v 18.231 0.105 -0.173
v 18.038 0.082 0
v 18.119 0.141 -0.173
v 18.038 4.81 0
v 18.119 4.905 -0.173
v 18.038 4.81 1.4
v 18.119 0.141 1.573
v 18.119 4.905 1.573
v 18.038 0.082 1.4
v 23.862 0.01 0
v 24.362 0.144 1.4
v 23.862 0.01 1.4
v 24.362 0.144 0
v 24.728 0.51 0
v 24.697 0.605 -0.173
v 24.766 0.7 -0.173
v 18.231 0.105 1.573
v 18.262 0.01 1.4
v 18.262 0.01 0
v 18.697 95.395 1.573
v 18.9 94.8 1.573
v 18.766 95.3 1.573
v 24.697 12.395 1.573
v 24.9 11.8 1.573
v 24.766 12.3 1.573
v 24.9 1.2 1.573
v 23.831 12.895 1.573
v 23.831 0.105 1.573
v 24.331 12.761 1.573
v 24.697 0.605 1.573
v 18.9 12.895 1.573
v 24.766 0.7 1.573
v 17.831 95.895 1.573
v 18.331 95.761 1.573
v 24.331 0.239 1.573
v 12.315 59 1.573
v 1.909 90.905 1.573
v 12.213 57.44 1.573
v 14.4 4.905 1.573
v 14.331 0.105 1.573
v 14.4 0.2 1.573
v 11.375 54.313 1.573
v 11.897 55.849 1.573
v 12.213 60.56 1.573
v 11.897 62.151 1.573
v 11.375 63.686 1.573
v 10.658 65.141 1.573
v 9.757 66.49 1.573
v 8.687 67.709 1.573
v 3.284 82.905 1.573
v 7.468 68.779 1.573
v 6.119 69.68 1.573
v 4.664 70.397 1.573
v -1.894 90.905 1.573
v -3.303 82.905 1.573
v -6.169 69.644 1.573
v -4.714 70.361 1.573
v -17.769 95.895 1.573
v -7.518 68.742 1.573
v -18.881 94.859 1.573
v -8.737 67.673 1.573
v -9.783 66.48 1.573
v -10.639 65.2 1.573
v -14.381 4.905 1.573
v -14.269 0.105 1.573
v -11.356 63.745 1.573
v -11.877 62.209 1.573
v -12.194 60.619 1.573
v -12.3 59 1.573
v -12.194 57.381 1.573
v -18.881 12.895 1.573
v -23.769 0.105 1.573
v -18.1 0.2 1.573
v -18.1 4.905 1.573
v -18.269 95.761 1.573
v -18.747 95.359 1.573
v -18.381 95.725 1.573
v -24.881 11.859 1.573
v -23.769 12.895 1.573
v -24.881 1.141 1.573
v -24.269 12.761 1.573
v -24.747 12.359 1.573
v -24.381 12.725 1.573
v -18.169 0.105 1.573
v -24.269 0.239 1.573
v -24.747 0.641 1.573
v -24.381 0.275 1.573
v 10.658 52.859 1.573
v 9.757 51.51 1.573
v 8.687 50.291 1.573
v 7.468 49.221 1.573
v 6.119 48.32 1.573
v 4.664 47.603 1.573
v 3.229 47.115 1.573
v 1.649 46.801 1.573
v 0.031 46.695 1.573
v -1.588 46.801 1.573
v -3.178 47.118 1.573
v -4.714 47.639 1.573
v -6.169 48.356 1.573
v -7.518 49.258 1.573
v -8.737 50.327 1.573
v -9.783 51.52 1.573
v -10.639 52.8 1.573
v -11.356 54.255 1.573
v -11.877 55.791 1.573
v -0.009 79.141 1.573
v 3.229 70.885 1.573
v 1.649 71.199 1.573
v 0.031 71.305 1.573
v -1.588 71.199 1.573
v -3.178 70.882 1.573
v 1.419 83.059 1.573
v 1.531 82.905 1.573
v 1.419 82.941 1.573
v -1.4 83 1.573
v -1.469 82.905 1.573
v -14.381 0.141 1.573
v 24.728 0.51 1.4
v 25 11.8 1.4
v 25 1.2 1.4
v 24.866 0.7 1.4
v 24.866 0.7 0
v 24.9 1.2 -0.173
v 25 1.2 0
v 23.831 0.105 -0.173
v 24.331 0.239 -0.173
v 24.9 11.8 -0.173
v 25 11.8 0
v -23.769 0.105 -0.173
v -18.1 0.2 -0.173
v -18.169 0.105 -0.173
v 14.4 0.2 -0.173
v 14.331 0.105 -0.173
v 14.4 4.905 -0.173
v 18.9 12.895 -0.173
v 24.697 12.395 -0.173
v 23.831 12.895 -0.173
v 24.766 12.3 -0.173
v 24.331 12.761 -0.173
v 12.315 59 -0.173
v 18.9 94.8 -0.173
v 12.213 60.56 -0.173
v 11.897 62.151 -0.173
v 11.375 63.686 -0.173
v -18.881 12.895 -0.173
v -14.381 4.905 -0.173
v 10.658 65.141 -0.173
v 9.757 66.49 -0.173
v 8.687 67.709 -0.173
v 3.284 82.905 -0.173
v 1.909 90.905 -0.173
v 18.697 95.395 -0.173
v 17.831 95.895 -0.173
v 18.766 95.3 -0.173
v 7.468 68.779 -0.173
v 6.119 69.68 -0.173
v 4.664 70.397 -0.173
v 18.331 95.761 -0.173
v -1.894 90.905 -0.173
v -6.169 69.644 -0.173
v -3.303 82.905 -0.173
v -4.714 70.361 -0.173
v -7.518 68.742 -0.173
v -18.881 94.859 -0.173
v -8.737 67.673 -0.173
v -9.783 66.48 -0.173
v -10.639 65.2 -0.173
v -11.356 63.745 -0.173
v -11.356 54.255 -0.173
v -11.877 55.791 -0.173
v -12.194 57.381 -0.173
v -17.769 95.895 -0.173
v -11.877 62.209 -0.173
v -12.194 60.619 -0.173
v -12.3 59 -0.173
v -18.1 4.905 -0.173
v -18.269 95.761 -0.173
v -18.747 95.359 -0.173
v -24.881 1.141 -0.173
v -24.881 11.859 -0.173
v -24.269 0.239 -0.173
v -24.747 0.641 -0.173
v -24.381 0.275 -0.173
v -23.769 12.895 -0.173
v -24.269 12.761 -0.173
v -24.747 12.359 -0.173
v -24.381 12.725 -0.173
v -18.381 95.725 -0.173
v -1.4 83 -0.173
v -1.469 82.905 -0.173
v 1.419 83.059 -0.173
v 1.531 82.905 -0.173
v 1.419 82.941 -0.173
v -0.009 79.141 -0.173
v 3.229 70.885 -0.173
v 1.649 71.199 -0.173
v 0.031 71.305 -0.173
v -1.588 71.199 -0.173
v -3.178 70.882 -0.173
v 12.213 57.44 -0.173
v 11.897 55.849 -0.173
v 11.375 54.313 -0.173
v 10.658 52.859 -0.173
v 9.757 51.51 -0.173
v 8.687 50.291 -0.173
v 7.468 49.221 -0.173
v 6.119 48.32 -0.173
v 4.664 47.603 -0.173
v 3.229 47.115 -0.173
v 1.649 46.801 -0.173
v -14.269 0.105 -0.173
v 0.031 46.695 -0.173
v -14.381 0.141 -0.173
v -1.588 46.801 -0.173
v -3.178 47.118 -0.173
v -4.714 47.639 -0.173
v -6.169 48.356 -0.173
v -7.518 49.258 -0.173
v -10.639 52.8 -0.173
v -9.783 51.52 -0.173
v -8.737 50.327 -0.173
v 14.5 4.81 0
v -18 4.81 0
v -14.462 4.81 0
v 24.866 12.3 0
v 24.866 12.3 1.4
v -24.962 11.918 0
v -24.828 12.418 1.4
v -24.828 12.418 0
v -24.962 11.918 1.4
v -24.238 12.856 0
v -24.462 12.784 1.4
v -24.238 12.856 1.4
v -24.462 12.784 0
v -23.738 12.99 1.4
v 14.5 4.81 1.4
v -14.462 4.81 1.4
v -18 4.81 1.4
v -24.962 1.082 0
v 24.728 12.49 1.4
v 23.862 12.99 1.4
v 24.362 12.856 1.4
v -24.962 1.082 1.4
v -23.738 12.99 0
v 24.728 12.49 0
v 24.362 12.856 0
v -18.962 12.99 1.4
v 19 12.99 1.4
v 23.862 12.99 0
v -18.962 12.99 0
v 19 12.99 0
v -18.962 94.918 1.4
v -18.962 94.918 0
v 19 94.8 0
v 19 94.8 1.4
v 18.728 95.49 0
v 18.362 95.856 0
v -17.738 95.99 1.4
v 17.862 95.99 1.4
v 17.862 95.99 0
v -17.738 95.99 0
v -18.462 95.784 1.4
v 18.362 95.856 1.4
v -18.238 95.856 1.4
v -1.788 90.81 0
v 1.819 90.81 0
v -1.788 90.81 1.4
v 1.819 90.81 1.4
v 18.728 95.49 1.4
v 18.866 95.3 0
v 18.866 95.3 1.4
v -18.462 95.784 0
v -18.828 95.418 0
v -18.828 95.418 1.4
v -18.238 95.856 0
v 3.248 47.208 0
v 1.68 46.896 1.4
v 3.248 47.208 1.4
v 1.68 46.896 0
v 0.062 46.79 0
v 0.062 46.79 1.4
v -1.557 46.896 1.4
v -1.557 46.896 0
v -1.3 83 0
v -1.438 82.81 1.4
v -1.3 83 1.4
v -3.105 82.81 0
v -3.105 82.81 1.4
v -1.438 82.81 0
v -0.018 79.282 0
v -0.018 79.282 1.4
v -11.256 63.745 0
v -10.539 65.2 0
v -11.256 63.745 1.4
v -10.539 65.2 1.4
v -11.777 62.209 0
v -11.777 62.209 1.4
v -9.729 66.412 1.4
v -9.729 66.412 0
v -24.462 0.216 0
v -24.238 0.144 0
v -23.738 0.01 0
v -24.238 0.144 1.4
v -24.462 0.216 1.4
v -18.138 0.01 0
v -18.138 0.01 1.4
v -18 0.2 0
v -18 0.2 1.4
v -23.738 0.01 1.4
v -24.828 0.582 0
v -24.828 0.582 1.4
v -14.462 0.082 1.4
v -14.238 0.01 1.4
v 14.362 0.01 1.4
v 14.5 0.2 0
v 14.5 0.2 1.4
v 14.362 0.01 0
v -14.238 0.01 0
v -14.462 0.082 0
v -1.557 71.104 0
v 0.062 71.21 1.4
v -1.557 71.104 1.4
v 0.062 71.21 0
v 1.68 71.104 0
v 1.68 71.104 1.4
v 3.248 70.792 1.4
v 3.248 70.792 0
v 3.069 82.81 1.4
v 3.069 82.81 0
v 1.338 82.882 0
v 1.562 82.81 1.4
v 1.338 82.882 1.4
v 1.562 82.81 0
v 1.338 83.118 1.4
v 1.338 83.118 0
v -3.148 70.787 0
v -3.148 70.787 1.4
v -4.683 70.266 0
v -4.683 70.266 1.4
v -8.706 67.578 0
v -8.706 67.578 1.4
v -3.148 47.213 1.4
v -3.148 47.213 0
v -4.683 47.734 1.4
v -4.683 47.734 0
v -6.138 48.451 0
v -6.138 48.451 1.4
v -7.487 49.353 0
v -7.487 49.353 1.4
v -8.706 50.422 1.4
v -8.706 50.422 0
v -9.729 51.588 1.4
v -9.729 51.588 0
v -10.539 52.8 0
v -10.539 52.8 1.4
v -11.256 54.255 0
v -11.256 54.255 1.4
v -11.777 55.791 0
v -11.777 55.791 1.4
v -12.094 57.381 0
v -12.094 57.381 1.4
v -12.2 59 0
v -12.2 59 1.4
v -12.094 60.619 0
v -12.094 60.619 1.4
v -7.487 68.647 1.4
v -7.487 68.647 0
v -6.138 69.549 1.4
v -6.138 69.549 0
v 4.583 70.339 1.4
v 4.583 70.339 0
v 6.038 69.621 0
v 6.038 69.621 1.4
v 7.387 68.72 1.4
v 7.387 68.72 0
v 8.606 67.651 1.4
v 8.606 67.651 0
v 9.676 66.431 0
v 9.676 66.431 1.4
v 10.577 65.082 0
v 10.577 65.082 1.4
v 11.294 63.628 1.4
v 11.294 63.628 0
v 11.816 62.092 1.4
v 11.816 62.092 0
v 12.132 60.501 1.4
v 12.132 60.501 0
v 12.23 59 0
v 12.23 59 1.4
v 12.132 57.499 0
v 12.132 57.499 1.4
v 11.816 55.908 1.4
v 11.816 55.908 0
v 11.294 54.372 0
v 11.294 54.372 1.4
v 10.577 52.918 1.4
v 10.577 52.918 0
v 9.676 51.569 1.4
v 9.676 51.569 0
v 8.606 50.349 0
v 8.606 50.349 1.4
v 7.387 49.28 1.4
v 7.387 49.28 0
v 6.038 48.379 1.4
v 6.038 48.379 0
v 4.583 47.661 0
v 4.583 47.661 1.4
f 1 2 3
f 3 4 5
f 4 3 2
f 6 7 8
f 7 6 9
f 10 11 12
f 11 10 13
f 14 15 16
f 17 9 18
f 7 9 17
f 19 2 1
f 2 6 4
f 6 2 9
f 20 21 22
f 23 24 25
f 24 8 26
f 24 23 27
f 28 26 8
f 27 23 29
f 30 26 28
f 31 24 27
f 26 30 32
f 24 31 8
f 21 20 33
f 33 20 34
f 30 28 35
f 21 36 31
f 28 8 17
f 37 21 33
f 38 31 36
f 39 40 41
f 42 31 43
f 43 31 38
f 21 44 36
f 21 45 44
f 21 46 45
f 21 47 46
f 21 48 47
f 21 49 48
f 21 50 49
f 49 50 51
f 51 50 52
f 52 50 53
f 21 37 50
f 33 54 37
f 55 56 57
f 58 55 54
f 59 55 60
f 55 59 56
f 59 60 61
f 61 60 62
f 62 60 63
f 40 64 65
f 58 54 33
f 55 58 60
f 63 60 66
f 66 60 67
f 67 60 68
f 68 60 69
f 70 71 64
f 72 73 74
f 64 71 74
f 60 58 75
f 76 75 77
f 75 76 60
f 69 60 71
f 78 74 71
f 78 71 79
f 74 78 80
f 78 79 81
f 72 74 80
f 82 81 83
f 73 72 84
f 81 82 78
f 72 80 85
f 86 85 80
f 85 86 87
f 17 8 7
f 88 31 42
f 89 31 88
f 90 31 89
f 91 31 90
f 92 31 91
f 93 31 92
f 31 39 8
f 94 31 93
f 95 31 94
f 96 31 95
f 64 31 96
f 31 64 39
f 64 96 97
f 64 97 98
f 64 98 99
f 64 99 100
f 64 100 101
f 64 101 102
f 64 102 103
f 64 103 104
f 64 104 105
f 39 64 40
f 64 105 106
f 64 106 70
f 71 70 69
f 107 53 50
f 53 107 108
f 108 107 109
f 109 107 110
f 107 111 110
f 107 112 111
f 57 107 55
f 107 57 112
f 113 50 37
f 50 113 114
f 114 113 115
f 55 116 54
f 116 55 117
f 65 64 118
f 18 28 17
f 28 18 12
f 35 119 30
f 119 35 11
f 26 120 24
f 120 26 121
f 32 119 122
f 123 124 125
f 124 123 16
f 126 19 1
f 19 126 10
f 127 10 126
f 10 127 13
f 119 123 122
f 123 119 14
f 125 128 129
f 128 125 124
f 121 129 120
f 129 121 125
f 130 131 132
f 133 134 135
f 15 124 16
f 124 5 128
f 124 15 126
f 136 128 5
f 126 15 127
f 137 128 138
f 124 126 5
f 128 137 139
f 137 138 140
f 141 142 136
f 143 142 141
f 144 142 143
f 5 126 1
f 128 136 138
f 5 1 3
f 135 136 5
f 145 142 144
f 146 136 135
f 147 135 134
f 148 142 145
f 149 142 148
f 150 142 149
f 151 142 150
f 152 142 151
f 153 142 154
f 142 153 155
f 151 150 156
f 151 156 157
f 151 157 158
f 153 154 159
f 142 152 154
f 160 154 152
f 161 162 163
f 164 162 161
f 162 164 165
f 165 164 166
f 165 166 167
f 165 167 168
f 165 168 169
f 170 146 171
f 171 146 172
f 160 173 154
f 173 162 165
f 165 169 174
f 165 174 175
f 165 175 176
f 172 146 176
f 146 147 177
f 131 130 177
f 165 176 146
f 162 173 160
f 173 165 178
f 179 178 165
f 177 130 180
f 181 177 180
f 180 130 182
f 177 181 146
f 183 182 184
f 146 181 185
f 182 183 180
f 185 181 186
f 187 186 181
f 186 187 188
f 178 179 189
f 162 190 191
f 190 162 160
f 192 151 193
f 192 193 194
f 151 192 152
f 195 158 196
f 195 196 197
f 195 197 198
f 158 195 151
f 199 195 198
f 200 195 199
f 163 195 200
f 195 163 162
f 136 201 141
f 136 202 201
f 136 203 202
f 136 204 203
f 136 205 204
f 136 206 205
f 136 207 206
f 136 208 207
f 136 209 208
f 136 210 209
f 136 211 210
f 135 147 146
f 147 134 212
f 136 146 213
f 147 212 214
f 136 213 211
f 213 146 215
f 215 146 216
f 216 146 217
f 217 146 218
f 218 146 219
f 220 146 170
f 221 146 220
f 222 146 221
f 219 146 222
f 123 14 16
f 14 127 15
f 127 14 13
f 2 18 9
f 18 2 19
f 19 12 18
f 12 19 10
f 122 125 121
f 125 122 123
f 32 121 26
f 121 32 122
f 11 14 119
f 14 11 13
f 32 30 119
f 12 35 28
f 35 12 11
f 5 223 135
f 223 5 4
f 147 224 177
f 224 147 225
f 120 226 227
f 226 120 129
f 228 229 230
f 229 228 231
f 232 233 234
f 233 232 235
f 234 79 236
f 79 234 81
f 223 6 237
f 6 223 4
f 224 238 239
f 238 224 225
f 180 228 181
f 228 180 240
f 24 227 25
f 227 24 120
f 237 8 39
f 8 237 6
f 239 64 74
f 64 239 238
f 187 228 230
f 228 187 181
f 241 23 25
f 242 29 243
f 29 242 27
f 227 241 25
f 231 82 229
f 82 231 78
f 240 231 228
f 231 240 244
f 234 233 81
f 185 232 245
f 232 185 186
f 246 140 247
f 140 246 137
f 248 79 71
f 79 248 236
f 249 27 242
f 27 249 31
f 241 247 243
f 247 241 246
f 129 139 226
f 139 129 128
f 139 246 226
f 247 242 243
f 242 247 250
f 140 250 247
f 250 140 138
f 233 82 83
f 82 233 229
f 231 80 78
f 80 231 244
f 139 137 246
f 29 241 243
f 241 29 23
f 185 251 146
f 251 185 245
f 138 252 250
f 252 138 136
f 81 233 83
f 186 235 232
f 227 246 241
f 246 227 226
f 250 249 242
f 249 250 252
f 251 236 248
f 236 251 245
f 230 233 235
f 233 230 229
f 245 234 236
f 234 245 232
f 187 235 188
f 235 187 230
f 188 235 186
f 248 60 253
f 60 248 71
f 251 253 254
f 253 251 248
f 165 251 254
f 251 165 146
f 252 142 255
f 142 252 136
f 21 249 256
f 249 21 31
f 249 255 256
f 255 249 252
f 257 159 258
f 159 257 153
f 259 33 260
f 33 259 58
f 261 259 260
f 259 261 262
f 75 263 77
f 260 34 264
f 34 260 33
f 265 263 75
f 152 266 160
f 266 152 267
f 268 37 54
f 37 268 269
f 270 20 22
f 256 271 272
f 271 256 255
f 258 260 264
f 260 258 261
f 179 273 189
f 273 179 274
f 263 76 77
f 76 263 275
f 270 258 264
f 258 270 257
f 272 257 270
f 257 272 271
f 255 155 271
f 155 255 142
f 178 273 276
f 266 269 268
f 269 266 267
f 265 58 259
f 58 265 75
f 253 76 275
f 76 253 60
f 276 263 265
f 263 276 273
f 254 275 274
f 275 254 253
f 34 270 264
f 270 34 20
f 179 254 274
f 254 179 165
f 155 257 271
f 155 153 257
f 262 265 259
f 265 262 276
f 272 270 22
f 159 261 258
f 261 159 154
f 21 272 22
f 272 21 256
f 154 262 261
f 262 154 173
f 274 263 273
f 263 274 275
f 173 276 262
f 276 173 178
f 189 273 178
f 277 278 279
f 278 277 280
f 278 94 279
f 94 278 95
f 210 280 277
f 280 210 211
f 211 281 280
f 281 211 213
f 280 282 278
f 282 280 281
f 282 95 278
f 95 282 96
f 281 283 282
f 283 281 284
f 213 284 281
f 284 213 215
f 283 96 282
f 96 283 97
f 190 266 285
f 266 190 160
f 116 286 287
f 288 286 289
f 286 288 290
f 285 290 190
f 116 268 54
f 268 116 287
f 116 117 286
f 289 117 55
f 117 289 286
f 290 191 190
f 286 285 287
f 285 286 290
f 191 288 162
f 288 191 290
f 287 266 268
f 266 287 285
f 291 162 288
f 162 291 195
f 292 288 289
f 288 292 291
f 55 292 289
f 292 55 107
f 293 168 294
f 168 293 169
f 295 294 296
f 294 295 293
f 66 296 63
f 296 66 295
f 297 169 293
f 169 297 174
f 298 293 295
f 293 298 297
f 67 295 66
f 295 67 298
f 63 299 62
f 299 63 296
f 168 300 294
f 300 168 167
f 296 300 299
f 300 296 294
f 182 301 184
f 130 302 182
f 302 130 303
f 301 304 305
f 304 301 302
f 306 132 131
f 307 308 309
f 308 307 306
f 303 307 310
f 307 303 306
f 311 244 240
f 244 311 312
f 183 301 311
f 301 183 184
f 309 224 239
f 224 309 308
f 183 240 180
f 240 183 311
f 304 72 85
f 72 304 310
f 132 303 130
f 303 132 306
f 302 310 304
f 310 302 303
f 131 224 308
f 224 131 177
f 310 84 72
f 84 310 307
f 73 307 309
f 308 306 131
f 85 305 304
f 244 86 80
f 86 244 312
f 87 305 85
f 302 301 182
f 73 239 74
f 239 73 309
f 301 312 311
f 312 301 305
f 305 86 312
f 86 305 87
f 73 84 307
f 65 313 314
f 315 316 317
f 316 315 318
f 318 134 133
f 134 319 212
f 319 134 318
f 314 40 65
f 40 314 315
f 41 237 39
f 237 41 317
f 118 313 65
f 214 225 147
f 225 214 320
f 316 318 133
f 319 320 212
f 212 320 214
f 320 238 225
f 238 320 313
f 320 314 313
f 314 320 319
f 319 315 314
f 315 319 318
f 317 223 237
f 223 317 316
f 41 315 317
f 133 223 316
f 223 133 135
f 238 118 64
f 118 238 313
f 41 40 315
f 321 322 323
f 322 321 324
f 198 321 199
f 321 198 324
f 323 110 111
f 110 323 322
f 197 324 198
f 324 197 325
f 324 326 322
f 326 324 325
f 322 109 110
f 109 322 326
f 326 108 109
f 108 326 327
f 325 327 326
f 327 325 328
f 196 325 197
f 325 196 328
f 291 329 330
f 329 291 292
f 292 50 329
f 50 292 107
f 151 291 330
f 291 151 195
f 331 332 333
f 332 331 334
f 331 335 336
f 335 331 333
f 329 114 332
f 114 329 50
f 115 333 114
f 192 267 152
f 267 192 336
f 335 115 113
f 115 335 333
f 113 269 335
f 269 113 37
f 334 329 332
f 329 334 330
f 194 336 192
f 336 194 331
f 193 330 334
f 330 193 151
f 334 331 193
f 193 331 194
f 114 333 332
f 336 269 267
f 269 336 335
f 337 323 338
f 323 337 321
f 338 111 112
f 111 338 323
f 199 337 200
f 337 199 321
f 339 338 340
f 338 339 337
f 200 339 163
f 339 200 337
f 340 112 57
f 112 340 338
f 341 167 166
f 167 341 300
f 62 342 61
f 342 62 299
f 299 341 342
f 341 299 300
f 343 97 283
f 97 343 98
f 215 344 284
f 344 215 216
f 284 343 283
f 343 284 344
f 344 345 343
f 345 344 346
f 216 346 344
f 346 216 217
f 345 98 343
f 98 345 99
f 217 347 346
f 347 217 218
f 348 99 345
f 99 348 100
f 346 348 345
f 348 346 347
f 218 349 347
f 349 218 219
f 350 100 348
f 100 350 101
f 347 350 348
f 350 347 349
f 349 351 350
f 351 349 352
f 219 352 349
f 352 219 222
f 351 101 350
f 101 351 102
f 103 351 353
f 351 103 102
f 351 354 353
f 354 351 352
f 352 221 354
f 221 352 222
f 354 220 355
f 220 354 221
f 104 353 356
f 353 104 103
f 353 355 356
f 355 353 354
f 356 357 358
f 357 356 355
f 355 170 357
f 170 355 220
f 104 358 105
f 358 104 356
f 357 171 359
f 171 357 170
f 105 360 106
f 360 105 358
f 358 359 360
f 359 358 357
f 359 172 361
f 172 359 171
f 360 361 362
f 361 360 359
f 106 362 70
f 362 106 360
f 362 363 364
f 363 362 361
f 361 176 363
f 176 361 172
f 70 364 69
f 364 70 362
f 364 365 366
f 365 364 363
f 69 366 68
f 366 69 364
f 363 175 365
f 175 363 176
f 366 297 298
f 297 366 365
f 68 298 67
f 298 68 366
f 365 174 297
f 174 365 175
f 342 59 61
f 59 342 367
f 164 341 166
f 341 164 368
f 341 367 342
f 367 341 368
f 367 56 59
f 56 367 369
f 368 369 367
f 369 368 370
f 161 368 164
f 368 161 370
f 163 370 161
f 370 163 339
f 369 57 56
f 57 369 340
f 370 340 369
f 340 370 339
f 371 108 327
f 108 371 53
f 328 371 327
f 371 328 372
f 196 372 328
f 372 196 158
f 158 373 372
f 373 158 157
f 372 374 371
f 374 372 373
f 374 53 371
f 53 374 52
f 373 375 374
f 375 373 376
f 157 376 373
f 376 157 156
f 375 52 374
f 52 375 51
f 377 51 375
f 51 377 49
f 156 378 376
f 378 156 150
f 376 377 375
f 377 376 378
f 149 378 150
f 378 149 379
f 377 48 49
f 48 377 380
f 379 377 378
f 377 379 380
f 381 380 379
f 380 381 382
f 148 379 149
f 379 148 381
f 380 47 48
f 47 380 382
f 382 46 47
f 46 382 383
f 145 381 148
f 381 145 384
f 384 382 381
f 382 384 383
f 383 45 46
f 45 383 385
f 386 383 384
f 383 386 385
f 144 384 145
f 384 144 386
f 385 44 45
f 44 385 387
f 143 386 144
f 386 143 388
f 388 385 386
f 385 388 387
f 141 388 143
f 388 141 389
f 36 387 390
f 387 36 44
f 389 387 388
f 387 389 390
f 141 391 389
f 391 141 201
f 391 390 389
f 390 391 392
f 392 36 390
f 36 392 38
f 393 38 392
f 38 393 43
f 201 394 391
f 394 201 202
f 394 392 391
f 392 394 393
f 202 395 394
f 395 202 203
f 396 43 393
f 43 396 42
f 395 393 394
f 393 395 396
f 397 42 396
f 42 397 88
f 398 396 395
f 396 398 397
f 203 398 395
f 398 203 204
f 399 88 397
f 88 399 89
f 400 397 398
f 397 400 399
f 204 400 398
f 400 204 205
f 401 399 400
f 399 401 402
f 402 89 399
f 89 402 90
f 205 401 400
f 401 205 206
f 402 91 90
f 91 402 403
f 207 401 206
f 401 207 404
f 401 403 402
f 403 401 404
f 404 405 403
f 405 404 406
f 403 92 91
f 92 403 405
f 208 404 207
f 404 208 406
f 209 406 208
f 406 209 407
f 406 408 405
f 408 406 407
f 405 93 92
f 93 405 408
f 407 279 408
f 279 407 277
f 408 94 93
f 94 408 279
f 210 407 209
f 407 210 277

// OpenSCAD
// Replacement part for the board game Camel Cup
//
// Background:
//   - https://de.wikipedia.org/wiki/Camel_Up
//   - CAD manual: http://www.openscad.org/documentation.html
//
//   - see also:
//     https://www.thingiverse.com/thing:5193783
//   - I forgot to search for related stuff before:
//     see also:
//     https://www.thingiverse.com/thing:3215604
//     https://www.thingiverse.com/thing:3729634
//     https://www.thingiverse.com/thing:2025015
//
// Andreas Merz 2022-01-08, v0.1 
// GPLv3 or later, see http://www.gnu.org/licenses



//---------------- Pyramid parts ---------------------

// the slider which is retracted by a rubber band
module pyramid_slider(
     r=1,           // chamfer / radius
     z=1.8,         // thickness
     ) {
     a=38;
     b=96;    // overall length
     c=50;    // overall width
     d=13;
     e=29;    // slot separation
     f=5;
     w=3.5;   // slot width
     m=0.2;   // chamfer 3D
     R=2*(r+m);
     minkowski() { 
       sphere(r=m);   // chamfer the whole thing, this is just nice to have ...
       linear_extrude(height=z-2*m) 
	 difference() {
	   union() {
             translate([0,b/2]) offset(r=r,$fn=12) square([a-R,b-R], center=true);
             translate([0,d/2]) offset(r=r,$fn=12) square([c-R,d-R], center=true);
	   }       
	   union() {
             translate([ (e+w)/2,0]) square([w+2*m, 2*f], center=true);  // slot
             translate([-(e+w)/2,0]) square([w+2*m, 2*f], center=true);  // slot
             translate([0, 59])      circle(d=24.4+2*m, $fn=48);        // hole
             // Arrow
	     translate([0, 79]) polygon(points=[[2,12],[1.5,4],[3.5,4],[0,0],[-3.5,4],[-1.5,4],[-2,12]]);

	   }       
	 }
     }
}



//---------------- Instances ---------------------

pyramid_slider();
